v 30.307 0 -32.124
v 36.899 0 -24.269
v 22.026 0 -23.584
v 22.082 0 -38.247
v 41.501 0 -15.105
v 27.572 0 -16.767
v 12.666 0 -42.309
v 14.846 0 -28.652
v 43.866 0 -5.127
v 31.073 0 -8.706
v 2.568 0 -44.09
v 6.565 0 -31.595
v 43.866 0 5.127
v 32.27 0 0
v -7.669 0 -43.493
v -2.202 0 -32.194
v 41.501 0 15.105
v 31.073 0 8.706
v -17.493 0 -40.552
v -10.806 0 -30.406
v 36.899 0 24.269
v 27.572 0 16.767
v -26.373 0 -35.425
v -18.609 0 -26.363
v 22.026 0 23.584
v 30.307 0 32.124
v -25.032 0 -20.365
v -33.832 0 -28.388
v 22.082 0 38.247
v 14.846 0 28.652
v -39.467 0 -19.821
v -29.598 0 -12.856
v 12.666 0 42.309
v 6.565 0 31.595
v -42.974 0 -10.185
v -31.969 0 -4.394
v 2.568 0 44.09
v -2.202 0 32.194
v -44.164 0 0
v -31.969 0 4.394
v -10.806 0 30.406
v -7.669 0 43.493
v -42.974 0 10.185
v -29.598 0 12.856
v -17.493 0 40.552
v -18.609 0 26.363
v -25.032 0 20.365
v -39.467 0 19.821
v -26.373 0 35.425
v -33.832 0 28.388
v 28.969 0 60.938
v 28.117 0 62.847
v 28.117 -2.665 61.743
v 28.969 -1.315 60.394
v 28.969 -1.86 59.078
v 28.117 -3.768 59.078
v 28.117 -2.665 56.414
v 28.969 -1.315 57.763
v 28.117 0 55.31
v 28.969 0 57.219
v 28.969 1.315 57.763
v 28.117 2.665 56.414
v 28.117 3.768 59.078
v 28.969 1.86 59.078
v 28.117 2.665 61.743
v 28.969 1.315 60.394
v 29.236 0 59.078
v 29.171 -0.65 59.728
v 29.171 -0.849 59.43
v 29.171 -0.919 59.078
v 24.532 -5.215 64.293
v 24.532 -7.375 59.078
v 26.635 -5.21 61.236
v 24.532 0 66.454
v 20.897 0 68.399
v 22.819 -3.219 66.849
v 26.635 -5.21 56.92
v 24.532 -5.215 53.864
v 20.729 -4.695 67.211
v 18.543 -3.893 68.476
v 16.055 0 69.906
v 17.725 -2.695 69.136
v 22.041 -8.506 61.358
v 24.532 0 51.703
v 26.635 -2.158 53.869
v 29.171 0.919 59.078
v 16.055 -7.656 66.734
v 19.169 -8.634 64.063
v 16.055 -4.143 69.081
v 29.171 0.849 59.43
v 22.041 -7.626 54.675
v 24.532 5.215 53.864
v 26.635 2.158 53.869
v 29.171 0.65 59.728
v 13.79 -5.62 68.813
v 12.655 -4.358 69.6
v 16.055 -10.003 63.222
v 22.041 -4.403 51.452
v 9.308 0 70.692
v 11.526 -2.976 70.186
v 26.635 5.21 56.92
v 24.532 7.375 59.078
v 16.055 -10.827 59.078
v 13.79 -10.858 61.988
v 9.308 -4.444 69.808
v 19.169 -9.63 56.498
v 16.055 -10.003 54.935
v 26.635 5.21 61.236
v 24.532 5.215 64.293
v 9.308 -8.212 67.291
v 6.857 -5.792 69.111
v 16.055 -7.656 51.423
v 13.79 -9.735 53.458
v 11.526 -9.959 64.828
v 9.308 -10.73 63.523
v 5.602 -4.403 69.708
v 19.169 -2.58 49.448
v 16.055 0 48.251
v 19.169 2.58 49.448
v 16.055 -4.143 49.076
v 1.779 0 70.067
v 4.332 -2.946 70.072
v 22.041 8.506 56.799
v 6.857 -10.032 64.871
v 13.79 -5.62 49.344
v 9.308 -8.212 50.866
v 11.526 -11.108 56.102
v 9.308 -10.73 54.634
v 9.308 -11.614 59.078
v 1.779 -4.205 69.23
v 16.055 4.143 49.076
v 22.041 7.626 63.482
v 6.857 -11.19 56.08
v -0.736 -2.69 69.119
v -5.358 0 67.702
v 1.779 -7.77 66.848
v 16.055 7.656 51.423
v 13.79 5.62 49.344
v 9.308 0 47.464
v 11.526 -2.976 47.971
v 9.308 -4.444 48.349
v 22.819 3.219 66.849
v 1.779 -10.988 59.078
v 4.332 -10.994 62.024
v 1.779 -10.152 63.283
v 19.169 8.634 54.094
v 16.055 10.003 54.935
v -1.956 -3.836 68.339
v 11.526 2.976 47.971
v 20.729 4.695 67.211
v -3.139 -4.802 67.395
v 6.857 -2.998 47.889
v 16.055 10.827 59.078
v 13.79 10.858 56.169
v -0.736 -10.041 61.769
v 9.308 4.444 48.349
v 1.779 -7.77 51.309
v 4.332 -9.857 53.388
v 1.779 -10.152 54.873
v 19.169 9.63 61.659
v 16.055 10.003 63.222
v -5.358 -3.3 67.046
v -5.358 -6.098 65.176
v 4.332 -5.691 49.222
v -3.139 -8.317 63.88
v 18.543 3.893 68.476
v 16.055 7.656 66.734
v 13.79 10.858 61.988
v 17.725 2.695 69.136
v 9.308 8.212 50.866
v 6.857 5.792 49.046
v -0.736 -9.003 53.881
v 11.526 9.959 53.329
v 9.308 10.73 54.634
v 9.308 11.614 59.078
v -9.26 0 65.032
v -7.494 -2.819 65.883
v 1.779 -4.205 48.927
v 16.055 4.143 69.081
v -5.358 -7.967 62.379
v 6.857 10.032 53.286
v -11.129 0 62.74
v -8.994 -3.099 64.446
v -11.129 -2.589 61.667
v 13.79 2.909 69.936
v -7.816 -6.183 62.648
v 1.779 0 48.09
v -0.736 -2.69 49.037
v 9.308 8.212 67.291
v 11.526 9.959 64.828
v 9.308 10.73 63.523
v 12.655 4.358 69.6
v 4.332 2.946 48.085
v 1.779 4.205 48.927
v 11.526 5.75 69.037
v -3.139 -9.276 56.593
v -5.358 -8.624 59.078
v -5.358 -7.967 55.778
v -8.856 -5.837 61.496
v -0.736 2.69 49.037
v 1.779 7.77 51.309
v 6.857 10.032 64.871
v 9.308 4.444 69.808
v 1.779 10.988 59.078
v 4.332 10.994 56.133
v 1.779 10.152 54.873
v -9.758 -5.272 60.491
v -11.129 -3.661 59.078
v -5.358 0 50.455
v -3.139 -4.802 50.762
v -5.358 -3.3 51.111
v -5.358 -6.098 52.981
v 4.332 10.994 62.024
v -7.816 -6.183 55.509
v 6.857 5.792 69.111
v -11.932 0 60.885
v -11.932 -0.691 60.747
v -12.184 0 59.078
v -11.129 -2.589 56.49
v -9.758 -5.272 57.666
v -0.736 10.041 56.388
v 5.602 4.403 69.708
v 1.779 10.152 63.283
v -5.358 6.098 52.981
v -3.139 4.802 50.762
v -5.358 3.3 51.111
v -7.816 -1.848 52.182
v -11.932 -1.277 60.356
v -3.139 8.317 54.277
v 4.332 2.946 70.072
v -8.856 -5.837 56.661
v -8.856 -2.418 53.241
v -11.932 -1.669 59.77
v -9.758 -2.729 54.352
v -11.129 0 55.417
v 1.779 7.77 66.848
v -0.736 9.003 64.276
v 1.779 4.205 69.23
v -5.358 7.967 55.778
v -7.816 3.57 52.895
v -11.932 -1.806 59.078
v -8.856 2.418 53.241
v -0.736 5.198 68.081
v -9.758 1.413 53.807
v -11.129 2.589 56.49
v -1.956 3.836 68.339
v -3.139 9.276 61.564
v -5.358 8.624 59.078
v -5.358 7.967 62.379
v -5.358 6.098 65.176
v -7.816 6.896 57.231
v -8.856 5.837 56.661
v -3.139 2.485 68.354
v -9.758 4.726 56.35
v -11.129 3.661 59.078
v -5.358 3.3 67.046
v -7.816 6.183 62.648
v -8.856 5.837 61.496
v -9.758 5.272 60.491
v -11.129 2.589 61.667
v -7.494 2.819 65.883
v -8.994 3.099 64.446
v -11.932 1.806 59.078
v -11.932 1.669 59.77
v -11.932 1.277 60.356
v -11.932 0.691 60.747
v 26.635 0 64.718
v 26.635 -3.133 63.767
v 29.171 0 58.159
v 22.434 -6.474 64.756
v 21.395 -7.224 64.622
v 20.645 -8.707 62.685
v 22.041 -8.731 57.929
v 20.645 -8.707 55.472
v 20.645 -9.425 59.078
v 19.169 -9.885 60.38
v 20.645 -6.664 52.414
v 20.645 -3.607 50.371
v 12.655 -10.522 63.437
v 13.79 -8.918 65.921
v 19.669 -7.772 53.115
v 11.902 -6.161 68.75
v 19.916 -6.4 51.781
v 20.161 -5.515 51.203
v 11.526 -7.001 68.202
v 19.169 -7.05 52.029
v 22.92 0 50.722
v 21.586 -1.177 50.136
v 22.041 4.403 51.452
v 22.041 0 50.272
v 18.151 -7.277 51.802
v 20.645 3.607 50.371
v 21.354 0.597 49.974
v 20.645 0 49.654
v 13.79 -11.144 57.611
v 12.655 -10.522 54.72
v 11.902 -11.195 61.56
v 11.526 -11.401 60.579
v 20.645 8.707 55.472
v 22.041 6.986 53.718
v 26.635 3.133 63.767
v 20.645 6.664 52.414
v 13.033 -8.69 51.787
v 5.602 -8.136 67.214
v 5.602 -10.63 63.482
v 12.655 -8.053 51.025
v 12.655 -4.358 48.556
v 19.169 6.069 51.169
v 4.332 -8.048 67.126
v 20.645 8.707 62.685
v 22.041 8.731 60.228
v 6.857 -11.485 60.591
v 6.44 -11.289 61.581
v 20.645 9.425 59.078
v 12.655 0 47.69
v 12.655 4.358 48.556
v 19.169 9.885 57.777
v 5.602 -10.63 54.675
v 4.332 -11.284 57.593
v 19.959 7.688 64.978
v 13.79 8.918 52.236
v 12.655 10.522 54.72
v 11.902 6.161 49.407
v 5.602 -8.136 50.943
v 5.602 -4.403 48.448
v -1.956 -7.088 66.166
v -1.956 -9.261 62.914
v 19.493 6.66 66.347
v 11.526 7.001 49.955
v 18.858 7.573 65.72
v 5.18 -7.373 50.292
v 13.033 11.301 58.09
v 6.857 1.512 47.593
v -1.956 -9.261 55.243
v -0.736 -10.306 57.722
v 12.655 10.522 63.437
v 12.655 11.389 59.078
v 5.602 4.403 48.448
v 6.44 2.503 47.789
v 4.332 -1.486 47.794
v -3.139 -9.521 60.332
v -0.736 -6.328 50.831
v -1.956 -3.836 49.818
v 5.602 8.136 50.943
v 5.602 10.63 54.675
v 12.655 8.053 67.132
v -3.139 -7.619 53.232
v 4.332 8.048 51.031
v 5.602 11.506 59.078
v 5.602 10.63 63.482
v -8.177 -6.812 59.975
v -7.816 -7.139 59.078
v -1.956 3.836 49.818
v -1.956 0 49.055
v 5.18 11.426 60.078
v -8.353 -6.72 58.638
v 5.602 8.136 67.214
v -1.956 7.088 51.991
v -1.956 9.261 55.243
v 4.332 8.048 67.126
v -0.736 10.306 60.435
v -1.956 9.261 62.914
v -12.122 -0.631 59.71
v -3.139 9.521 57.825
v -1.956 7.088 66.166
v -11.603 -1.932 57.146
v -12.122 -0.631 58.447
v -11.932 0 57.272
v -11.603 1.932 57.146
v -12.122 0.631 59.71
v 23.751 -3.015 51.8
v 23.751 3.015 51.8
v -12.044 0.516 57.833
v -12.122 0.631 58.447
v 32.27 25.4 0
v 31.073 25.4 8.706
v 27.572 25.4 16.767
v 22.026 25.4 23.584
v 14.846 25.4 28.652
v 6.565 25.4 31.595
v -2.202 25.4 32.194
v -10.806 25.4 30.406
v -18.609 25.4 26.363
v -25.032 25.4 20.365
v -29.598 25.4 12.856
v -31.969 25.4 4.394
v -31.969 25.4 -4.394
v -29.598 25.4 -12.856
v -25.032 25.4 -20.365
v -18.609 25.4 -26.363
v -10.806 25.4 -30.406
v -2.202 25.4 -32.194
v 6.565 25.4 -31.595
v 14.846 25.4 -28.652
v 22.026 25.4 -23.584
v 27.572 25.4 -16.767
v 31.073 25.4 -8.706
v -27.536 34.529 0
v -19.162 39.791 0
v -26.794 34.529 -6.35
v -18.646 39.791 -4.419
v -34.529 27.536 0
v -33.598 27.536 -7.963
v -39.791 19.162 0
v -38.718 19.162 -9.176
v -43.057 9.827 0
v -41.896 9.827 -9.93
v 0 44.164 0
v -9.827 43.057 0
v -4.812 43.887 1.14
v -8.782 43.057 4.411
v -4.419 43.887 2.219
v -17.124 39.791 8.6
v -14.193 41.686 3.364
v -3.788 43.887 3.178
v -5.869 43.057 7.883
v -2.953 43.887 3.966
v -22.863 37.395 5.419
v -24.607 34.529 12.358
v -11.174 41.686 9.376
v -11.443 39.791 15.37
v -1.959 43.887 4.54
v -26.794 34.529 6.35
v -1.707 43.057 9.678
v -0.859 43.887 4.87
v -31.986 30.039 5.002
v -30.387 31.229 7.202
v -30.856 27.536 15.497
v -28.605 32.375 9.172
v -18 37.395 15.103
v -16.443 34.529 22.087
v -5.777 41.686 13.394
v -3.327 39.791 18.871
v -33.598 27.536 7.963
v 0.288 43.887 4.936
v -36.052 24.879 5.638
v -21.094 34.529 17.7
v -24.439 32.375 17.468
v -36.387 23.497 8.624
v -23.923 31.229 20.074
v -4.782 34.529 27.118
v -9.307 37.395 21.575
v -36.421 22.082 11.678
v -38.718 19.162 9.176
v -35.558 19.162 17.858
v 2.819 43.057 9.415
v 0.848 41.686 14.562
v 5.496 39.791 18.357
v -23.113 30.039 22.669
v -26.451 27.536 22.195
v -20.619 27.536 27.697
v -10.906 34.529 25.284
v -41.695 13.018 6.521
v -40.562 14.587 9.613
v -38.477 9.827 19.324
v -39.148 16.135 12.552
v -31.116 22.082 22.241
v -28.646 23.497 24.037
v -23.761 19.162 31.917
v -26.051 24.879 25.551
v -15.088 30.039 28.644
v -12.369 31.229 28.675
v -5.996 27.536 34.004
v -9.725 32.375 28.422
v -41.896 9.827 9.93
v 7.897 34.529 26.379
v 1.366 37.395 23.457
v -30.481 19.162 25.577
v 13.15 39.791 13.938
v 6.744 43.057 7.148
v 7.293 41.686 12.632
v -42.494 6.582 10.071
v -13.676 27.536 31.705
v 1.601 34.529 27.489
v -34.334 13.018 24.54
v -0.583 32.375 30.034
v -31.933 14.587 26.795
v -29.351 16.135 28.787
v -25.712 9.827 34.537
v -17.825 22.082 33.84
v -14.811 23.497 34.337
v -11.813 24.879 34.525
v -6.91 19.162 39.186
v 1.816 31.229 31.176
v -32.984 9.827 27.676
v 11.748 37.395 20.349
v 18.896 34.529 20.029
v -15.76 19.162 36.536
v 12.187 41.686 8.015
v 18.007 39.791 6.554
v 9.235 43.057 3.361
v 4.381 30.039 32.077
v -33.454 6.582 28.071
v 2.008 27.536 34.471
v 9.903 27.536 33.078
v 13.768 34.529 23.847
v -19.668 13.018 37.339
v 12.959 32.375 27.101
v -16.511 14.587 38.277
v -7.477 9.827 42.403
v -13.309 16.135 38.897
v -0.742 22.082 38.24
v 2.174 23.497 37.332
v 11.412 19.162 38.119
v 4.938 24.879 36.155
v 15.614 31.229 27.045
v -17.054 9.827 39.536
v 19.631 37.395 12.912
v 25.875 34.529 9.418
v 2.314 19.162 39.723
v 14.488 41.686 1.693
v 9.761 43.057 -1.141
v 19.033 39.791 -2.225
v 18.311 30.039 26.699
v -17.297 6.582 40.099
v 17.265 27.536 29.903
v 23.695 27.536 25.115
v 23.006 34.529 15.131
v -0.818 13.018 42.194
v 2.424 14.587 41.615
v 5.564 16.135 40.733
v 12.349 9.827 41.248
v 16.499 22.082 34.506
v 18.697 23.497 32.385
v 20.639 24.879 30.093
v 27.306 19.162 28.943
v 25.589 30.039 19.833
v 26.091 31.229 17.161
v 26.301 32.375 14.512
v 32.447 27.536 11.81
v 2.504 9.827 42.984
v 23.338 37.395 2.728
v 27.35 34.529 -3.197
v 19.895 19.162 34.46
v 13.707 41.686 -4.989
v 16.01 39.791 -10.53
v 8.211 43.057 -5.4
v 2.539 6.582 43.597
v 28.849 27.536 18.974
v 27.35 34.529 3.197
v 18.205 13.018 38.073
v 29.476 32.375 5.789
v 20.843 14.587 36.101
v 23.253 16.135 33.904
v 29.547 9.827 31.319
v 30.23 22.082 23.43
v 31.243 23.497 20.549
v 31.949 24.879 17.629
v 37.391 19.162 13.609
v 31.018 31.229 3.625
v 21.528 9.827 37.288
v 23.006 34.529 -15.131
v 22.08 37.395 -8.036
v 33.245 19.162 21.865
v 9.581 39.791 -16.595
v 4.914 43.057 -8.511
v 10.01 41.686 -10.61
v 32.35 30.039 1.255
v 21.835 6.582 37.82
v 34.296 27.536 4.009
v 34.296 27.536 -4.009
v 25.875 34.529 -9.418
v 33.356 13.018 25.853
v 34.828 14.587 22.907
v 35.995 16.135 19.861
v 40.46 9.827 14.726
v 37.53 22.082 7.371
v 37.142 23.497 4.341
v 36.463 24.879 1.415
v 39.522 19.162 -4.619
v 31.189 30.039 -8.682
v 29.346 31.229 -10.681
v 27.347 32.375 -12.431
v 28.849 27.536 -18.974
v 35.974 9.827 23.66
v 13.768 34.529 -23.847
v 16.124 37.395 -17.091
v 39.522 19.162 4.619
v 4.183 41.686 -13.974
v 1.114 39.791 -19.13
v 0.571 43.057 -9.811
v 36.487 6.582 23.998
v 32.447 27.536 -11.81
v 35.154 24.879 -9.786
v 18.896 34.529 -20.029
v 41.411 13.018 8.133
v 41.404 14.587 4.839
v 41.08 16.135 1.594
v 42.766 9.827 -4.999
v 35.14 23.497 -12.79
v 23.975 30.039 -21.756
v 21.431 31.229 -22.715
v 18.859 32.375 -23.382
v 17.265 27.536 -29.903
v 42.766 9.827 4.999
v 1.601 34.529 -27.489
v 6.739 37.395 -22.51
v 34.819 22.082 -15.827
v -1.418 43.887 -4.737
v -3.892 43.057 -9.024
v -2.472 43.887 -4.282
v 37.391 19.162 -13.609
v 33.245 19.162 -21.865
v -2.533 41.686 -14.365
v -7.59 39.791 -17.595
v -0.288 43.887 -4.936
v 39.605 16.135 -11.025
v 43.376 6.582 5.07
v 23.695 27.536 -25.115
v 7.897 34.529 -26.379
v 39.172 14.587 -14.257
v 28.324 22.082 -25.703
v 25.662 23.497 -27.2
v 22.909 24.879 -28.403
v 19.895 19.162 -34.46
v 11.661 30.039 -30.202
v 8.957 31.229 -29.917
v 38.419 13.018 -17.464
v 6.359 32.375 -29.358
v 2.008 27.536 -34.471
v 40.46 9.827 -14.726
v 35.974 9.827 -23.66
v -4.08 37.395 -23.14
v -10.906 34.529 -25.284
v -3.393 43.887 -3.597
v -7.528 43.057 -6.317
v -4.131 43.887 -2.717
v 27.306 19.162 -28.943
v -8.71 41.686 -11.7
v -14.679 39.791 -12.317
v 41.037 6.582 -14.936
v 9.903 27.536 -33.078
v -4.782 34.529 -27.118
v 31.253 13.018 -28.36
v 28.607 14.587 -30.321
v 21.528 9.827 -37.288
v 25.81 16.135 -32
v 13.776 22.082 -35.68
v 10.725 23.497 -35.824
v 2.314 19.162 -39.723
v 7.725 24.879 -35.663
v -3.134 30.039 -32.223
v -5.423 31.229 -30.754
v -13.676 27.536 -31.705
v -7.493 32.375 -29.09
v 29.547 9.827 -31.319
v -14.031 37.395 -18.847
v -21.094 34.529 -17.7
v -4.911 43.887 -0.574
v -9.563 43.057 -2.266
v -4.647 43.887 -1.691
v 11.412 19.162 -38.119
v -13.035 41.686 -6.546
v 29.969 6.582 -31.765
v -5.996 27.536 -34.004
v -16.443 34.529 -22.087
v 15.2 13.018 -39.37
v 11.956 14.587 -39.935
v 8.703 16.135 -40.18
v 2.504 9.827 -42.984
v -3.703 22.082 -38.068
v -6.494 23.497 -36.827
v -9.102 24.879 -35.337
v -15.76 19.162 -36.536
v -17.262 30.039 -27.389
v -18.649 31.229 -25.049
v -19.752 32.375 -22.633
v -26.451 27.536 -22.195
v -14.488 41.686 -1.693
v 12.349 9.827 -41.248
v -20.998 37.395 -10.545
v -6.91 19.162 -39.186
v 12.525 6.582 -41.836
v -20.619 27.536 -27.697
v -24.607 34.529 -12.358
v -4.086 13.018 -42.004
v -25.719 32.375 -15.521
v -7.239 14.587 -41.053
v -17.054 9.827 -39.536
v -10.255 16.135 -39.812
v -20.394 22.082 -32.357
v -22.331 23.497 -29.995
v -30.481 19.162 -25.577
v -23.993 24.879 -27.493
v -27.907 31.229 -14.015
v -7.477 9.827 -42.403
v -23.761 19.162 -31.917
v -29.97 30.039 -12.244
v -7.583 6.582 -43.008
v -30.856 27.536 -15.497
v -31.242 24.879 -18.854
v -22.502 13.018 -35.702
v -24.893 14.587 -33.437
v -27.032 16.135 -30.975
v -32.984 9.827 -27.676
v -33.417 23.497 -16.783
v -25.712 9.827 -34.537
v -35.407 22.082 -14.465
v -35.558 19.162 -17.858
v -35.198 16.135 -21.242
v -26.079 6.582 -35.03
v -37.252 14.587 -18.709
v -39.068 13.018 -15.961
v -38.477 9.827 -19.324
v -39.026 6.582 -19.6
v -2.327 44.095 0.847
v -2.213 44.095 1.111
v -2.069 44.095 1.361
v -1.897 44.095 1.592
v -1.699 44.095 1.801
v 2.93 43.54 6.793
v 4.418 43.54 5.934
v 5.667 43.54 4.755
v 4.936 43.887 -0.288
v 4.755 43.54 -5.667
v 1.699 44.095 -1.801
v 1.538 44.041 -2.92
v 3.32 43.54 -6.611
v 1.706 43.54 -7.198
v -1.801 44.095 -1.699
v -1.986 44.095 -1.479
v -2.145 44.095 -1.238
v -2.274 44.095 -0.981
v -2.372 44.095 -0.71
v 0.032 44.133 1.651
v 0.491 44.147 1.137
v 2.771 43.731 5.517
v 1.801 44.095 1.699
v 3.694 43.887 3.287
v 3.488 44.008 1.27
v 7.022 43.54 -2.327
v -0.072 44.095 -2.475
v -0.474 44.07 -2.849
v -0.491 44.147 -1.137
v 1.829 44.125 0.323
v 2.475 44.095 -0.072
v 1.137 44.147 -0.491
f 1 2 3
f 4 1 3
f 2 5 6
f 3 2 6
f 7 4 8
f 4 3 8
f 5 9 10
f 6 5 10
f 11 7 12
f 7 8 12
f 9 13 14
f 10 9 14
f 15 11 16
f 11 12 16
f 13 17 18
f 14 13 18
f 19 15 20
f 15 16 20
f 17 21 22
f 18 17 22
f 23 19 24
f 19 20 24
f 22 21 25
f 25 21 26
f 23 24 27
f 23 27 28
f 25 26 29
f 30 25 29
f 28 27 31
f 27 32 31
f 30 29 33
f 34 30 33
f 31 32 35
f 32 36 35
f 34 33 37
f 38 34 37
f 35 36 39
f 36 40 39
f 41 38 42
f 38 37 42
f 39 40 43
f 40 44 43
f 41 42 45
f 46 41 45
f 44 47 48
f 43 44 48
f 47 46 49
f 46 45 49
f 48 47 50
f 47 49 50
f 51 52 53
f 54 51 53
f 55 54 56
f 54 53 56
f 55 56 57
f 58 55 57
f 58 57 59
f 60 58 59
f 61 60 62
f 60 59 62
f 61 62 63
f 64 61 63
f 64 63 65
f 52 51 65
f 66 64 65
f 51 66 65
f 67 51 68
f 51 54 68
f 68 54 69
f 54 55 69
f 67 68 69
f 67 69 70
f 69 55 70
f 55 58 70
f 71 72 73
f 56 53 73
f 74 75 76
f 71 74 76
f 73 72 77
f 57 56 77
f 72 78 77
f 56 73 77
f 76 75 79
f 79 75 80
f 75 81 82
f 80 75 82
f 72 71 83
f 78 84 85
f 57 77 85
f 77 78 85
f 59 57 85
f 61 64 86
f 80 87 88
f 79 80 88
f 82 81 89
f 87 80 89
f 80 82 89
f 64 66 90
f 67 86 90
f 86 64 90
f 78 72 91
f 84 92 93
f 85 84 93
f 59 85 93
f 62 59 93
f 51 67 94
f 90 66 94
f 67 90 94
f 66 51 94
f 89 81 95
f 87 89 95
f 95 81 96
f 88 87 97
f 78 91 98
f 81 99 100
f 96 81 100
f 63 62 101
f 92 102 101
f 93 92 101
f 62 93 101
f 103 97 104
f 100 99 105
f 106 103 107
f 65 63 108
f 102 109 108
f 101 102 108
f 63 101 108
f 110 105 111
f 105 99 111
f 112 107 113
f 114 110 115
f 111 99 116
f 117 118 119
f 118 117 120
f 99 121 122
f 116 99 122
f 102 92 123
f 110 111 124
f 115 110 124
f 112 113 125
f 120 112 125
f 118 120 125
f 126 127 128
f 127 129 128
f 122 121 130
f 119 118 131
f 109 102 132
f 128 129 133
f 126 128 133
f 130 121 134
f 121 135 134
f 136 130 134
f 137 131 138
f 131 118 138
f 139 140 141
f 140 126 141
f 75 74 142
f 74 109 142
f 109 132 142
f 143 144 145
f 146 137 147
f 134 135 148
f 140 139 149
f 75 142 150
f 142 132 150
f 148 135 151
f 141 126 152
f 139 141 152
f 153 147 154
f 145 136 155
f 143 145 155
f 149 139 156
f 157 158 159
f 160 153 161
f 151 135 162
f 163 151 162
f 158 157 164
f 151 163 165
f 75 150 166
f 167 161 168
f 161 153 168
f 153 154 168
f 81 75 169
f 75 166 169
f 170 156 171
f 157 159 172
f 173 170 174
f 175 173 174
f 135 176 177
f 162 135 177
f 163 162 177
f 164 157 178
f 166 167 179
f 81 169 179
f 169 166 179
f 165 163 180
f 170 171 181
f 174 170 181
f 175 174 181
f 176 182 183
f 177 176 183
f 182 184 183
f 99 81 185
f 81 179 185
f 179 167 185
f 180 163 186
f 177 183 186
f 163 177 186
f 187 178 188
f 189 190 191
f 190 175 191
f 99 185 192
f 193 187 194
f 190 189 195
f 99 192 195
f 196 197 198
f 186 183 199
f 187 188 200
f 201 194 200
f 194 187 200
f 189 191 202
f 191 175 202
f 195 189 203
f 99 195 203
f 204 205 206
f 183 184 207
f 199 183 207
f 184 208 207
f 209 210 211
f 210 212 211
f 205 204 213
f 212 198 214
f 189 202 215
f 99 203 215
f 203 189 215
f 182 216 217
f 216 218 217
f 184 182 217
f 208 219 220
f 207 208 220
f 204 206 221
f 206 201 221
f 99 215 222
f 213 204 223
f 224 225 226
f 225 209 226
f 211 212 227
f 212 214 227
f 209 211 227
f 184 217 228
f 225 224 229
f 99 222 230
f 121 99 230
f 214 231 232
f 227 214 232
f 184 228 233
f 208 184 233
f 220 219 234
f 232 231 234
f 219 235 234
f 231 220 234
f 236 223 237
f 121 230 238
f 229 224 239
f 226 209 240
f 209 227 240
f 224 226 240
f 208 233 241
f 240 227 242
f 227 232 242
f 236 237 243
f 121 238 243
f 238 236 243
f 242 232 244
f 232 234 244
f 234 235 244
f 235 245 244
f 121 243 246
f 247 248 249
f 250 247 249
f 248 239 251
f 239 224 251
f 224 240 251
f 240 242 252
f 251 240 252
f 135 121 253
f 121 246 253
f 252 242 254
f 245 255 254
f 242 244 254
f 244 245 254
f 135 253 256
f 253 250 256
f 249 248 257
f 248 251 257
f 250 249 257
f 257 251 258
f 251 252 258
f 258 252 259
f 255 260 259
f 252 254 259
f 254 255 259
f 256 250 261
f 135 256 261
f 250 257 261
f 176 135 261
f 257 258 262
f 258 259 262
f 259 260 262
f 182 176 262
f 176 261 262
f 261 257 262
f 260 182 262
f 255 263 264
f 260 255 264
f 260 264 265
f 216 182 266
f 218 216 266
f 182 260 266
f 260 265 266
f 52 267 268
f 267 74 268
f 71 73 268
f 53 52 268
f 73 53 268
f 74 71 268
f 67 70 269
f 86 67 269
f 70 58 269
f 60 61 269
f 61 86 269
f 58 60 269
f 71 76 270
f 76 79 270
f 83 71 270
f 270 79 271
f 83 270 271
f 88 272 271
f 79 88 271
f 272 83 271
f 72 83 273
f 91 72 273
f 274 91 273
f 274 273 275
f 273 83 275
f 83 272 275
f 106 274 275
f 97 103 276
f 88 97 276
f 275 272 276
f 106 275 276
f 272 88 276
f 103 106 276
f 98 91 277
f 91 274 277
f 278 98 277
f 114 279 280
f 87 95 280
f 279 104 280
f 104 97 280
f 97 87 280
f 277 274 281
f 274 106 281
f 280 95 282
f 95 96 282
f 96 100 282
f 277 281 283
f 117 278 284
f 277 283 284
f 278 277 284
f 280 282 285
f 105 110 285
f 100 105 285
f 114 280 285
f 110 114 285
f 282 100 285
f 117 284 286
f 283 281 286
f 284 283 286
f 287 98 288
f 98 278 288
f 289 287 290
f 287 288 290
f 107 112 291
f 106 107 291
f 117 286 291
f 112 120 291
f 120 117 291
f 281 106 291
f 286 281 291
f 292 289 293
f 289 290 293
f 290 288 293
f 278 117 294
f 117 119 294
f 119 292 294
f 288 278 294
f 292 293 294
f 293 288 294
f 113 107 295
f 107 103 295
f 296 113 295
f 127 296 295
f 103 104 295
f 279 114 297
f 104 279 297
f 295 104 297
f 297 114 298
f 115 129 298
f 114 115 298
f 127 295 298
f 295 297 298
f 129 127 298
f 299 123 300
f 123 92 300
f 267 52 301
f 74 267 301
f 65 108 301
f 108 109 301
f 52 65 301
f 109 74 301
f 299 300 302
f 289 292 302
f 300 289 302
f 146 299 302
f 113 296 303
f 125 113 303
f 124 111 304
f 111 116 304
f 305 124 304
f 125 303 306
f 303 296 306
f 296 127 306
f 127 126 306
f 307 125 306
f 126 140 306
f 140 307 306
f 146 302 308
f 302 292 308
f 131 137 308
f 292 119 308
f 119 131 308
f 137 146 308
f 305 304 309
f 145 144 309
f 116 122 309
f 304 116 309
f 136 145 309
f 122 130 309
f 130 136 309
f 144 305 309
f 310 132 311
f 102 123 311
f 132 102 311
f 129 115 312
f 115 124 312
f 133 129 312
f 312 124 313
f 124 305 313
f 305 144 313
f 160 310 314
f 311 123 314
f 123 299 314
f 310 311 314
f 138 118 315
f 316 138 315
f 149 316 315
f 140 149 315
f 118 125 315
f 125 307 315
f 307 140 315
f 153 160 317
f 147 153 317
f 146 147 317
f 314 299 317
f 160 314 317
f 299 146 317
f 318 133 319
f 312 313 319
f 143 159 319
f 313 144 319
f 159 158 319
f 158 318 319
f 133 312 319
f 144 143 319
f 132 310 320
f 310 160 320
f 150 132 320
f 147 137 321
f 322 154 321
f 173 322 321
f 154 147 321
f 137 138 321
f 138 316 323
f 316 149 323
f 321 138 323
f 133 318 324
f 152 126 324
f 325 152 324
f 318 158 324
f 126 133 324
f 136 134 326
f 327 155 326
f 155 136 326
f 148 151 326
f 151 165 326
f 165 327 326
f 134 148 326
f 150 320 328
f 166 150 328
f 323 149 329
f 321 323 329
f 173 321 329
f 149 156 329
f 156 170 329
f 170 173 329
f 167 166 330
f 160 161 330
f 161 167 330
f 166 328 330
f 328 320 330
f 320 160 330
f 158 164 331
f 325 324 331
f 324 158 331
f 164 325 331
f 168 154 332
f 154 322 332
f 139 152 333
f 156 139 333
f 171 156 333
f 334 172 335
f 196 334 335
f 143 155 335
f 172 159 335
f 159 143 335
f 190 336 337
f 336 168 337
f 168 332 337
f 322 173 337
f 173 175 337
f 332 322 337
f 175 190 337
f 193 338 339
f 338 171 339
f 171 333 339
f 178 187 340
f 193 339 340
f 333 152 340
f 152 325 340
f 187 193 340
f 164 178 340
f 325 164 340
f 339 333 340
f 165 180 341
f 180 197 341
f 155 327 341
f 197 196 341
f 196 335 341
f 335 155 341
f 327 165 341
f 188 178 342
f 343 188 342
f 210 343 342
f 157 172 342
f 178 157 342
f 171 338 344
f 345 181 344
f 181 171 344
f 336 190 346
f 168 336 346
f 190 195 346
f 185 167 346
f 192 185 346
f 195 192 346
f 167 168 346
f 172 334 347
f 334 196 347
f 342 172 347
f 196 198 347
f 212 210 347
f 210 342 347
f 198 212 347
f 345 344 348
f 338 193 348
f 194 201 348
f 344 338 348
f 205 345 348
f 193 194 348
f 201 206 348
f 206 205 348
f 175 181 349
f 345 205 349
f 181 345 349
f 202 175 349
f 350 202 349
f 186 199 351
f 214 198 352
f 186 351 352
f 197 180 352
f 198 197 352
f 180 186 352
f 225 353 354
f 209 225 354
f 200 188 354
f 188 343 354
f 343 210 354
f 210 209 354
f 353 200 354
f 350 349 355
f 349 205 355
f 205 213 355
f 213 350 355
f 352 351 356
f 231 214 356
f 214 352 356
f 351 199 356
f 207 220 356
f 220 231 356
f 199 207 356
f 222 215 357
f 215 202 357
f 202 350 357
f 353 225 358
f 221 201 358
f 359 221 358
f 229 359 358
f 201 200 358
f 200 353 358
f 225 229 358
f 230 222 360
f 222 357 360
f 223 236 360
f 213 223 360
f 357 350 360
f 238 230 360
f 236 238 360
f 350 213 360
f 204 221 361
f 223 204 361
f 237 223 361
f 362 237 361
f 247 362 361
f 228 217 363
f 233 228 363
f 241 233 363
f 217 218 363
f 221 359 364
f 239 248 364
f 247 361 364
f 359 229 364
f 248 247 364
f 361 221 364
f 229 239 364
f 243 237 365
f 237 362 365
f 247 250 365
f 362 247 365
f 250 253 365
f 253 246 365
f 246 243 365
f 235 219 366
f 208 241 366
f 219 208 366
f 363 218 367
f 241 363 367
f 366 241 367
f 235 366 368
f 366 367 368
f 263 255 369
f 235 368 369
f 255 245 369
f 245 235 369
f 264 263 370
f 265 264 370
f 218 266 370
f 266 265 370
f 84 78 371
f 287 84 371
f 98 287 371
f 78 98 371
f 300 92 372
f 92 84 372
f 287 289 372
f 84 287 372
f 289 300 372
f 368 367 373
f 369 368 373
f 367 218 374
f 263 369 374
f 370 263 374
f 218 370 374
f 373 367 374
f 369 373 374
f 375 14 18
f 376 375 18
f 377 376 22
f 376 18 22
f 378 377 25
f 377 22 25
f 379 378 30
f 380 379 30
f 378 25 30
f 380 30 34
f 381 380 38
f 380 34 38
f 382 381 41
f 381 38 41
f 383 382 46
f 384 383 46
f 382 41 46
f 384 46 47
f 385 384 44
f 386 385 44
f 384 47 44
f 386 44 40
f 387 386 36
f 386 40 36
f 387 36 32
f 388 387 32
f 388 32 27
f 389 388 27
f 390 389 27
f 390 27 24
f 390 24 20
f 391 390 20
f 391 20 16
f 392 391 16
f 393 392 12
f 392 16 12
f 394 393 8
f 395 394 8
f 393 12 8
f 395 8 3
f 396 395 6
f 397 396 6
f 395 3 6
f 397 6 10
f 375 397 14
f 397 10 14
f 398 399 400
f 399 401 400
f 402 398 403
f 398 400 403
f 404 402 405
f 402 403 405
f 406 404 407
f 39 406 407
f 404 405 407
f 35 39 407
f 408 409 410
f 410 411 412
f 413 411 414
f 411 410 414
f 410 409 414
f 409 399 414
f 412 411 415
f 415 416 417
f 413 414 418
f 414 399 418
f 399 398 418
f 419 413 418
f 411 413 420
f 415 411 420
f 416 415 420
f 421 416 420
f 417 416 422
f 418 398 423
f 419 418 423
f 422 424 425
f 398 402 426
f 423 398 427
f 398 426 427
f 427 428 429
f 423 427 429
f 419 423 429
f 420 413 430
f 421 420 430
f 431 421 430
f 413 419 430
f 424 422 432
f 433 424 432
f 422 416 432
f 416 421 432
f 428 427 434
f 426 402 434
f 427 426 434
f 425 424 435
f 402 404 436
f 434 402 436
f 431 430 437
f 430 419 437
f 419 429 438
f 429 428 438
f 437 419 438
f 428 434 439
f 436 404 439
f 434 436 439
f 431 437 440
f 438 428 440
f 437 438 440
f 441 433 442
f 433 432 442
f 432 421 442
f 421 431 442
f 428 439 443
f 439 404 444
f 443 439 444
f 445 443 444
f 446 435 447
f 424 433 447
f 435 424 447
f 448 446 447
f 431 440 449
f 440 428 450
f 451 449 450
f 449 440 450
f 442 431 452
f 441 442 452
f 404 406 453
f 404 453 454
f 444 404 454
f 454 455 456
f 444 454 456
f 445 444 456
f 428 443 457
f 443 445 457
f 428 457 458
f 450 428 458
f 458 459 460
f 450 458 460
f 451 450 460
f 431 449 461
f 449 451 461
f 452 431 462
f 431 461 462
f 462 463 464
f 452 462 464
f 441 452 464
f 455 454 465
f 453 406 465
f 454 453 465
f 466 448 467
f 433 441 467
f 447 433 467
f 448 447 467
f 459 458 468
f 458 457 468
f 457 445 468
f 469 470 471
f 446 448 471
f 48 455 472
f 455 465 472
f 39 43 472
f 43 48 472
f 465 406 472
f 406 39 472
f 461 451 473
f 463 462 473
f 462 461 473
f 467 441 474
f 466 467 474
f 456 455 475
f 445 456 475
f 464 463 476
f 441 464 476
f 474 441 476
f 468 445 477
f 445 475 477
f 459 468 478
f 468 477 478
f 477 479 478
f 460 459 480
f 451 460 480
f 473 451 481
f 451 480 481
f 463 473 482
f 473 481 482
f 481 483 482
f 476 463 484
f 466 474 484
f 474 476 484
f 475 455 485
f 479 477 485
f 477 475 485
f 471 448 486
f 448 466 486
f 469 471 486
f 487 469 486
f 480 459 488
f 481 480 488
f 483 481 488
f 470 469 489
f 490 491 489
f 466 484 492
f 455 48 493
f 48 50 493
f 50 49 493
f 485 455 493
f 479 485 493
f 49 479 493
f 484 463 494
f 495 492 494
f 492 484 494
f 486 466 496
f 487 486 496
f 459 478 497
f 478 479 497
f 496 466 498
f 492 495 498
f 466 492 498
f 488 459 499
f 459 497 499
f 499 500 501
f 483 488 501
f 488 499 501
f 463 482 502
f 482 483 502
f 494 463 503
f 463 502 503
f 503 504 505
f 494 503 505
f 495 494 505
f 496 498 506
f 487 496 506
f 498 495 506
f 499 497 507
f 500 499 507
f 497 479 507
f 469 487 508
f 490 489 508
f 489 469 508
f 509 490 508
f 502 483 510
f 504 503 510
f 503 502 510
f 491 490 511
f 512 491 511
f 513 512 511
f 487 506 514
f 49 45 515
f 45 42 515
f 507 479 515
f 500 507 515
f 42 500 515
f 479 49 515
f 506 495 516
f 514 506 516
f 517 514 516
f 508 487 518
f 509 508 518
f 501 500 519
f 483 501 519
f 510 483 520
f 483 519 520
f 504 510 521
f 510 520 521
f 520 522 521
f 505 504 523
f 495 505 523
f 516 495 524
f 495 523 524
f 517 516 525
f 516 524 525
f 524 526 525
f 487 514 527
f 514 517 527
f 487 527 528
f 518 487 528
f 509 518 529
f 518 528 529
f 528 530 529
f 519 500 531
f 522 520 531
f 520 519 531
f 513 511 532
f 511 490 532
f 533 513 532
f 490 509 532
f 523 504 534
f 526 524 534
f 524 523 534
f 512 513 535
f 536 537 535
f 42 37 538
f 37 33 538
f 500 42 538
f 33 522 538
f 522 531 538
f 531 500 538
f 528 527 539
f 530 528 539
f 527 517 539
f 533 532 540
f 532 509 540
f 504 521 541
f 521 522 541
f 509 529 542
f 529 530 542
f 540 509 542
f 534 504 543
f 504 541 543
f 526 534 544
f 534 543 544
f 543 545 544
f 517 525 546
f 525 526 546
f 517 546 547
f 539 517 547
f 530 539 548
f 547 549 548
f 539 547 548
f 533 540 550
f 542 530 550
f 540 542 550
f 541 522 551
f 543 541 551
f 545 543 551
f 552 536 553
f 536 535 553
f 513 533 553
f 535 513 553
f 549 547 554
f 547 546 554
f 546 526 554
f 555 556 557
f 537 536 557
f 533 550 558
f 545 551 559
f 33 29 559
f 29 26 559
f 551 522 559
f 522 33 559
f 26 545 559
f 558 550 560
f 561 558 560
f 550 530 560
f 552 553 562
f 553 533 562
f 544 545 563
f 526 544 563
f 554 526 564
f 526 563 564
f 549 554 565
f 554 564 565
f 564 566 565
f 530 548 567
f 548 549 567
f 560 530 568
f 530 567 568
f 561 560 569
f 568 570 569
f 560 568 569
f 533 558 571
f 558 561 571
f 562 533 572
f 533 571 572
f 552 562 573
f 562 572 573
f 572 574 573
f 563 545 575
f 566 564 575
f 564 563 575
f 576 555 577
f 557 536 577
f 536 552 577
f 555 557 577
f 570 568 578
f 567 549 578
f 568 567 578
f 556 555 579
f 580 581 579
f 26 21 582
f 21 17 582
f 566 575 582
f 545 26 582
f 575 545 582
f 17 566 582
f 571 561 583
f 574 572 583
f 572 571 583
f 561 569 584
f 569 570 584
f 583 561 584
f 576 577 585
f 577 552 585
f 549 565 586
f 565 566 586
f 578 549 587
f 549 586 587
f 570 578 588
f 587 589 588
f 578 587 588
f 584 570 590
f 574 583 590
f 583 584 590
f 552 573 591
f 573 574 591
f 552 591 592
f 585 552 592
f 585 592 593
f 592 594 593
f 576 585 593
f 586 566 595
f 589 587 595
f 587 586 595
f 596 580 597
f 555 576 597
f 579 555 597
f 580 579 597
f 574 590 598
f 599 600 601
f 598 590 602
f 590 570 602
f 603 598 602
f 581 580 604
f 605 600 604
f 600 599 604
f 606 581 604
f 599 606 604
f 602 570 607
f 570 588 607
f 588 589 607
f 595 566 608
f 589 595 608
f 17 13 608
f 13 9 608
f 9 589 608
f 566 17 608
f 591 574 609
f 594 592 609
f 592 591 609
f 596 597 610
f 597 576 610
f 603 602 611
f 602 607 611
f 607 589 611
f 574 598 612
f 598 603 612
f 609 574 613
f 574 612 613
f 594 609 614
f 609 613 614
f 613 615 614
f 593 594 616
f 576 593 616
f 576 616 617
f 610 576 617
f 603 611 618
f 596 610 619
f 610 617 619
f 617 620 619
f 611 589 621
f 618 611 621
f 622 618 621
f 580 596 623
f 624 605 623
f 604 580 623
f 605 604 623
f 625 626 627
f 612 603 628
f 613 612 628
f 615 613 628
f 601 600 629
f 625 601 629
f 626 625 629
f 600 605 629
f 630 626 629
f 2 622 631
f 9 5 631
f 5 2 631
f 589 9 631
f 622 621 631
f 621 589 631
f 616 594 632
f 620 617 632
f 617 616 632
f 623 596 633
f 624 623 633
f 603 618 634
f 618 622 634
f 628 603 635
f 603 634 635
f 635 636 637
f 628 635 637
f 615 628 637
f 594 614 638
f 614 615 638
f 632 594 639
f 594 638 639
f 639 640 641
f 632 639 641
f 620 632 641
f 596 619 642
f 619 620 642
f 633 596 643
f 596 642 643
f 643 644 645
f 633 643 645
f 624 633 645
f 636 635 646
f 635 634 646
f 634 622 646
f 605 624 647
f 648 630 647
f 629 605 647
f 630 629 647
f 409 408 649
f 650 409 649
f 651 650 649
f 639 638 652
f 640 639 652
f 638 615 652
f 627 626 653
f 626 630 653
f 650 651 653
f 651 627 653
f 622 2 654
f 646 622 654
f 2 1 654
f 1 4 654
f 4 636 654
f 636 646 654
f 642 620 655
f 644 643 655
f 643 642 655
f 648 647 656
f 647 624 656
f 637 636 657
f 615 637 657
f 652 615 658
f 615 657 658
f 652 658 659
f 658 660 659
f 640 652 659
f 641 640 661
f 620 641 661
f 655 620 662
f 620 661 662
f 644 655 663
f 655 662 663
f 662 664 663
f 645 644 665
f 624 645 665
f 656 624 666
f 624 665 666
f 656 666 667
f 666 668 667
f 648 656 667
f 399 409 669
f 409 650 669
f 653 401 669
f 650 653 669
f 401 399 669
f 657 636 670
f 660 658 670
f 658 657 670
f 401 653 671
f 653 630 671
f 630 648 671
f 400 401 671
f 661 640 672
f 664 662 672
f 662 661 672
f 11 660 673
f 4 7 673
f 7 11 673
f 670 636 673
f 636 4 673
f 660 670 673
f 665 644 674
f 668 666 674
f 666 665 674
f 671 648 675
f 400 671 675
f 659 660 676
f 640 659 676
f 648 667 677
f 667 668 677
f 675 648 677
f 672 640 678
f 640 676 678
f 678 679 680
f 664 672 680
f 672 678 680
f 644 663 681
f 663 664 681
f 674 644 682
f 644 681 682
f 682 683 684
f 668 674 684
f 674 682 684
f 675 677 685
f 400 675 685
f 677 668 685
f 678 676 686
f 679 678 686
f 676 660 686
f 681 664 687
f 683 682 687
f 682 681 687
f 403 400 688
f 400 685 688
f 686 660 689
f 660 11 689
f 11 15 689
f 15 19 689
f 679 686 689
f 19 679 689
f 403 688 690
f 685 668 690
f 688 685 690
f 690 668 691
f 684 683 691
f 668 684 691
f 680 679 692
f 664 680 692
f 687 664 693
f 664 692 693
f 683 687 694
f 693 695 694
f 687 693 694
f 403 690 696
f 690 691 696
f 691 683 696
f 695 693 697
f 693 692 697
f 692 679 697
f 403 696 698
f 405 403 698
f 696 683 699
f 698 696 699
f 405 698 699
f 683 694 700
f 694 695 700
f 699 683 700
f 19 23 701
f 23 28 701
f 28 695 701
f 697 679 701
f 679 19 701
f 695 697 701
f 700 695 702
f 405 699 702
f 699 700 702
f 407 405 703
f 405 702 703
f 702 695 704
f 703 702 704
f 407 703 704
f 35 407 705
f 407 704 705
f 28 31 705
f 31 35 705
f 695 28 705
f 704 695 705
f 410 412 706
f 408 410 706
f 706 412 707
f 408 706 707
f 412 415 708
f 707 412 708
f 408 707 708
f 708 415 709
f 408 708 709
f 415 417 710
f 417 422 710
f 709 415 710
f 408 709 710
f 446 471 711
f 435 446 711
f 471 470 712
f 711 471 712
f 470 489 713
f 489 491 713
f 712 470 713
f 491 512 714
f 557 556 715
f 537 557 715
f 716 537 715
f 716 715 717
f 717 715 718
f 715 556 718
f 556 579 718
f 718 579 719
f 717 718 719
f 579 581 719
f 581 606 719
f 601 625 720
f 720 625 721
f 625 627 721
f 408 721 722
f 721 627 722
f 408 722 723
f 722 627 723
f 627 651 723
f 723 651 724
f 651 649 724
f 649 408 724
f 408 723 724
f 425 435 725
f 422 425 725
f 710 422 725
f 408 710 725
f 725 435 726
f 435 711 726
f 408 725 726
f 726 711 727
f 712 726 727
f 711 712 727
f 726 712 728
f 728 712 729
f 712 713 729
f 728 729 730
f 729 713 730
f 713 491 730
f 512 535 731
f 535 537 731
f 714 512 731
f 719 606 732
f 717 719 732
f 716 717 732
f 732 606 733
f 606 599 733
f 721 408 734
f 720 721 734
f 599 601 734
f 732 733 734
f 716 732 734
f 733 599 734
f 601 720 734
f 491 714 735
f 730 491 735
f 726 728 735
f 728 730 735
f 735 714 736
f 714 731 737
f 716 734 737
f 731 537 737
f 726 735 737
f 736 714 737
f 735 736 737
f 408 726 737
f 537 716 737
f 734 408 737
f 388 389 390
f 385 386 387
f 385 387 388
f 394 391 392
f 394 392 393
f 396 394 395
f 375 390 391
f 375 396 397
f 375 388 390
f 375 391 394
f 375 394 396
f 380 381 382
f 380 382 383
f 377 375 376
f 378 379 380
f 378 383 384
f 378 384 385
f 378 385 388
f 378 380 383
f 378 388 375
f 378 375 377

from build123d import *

# Parameters (mm, degrees)
F2_R     = 32.269591
F3_DEPTH = 25.4


with BuildPart() as f1:
    # F0 (on Top) → F1 (revolve)
    with BuildSketch(Plane.XY):
        with BuildLine():
            Line((0, 0), (0, 44.164269))
            ThreePointArc((0, 44.164269), (-31.228854, 31.228854), (-44.164269, 0))
            Line((-44.164269, 0), (0, 0))
        make_face()
    revolve(axis=Axis((0, 22.082135, 0), (0, 1, 0)))

    # F2 (on face) → F3 (cut)
    with BuildSketch(Plane.XZ):
        Circle(F2_R)
    extrude(amount=-F3_DEPTH, mode=Mode.SUBTRACT)


with BuildPart() as f5:
    # F4 (on Front) → F5 (revolve)
    with BuildSketch(Plane.XZ):
        with BuildLine():
            add(Edge.make_bspline(
                [(29.235666, 59.07847), (29.235666, 70.700761), (8.525984, 70.700761), (-12.183697, 70.700761), (-12.183697, 59.07847)],
                knots=[3.141593, 3.141593, 3.141593, 4.712389, 4.712389, 6.283185, 6.283185, 6.283185], degree=2, weights=[1, 0.707107, 1, 0.707107, 1]))
            Line((-12.183697, 59.07847), (29.235666, 59.07847))
        make_face()
    revolve(axis=Axis((8.525984, 0, 59.07847), (1, 0, 0)))


solid = Compound([f1.part, f5.part])
